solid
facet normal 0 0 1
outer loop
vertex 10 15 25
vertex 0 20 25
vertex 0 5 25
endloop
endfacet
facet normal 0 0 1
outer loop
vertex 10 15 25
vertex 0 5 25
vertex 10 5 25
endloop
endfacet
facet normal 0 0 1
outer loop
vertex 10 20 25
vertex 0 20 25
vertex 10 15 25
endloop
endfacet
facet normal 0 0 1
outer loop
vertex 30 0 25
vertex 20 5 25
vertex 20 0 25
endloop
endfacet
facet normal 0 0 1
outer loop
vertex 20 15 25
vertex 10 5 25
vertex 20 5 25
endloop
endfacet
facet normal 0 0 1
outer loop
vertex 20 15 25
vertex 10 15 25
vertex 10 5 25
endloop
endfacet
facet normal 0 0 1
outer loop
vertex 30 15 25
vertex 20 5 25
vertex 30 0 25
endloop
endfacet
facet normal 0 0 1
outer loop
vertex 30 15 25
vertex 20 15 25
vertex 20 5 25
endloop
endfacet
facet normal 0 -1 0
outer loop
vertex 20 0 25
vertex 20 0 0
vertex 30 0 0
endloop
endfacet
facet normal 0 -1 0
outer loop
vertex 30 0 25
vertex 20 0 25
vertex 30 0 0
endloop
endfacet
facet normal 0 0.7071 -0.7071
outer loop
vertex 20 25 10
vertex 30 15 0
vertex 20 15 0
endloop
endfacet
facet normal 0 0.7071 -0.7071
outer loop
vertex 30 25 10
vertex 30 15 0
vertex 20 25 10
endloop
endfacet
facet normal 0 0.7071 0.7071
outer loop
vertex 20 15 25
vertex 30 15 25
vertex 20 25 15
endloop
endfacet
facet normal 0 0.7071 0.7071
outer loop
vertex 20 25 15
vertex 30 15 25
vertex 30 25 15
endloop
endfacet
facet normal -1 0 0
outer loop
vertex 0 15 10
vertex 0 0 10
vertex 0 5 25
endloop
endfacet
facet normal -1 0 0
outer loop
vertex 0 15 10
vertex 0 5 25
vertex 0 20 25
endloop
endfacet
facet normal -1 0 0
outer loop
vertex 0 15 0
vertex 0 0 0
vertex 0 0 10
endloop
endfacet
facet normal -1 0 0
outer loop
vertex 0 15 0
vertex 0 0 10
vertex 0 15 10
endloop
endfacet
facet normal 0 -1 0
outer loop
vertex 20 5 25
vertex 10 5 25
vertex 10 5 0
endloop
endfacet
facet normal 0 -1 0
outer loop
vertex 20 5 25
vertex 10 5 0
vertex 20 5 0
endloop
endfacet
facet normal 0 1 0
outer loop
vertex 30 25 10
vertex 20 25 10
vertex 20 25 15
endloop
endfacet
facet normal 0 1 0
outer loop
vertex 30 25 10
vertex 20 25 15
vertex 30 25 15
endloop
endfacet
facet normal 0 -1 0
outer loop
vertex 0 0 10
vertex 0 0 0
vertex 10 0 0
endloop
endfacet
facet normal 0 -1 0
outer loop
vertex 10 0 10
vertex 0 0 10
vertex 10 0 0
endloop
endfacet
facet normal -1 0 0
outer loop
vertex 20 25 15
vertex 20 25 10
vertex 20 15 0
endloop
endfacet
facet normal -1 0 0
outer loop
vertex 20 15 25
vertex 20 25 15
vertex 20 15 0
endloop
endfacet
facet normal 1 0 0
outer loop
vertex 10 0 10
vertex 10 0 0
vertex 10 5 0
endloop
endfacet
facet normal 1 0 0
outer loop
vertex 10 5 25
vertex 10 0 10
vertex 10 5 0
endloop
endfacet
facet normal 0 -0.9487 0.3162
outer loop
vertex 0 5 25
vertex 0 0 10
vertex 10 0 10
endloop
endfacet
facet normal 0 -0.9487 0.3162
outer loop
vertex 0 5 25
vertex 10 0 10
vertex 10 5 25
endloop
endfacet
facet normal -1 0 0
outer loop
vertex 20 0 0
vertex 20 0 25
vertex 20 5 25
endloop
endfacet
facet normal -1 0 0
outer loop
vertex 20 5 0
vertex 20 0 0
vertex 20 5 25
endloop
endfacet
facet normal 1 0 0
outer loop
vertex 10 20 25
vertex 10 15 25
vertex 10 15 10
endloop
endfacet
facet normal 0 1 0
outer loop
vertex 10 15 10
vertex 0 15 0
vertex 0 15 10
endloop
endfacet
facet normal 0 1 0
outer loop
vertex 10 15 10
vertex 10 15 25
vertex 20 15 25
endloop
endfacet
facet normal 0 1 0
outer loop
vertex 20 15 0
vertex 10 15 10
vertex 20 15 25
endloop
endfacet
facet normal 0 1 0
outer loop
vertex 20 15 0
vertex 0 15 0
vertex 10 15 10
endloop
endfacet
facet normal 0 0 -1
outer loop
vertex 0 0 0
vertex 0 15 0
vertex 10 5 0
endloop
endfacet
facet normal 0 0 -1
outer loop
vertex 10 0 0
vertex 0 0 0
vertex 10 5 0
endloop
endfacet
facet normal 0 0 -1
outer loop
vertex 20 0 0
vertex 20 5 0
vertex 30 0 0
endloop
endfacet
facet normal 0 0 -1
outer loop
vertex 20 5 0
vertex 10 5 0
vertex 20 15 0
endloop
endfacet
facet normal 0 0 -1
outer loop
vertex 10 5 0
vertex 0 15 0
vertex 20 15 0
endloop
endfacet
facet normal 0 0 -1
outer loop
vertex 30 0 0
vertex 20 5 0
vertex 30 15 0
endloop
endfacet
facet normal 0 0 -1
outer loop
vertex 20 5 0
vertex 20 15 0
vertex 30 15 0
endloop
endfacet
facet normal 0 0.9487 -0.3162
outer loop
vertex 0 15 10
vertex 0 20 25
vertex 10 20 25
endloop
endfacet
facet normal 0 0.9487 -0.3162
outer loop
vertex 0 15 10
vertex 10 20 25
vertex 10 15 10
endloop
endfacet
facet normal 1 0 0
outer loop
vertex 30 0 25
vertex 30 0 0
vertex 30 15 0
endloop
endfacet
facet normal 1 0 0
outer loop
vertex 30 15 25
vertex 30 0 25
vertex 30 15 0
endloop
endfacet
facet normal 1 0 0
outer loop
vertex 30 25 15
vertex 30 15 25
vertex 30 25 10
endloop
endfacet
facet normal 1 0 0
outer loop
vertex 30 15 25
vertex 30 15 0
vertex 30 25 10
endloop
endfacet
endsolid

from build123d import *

# Parameters (mm, degrees)
SKETCH1_W           = 30
SKETCH1_H           = 25
BOSS_EXTRUDE1_DEPTH = 25
CUT_EXTRUDE1_DEPTH  = 10
SKETCH3_W           = 10
SKETCH3_H           = 5
CUT_EXTRUDE2_DEPTH  = 30
CUT_EXTRUDE3_DEPTH  = 30
CUT_EXTRUDE5_DEPTH  = 10
SKETCH7_W           = 10
SKETCH7_H           = 10
CUT_EXTRUDE6_DEPTH  = 5


with BuildPart() as part:
    # Sketch1 → Boss-Extrude1 (new body)
    with BuildSketch(Plane.XY):
        with Locations((15, 12.5)):
            Rectangle(SKETCH1_W, SKETCH1_H)
    extrude(amount=BOSS_EXTRUDE1_DEPTH)

    # Sketch2 → Cut-Extrude1 (cut)
    with BuildSketch(Plane(origin=(30, 0, 0), x_dir=(0, 0, -1), z_dir=(1, 0, 0))):
        Polygon((-25, 25), (-25, 15), (-15, 25), align=None)
        Polygon((-10, 25), (0, 25), (0, 15), align=None)
    extrude(amount=-CUT_EXTRUDE1_DEPTH, mode=Mode.SUBTRACT)

    # Sketch3 → Cut-Extrude2 (cut)
    with BuildSketch(Plane.XY.offset(25)):
        with Locations((15, 2.5)):
            Rectangle(SKETCH3_W, SKETCH3_H)
    extrude(amount=-CUT_EXTRUDE2_DEPTH, mode=Mode.SUBTRACT)

    # Sketch4 → Cut-Extrude3 (cut)
    with BuildSketch(Plane.XY.offset(25)):
        Polygon((0, 25), (20, 25), (20, 15), (10, 15), (10, 20), (0, 20), align=None)
    extrude(amount=-CUT_EXTRUDE3_DEPTH, mode=Mode.SUBTRACT)

    # Sketch6 → Cut-Extrude5 (cut)
    with BuildSketch(Plane.ZY):
        Polygon((25, 20), (10, 15), (10, 20), align=None)
        Polygon((25, 0), (10, 0), (25, 5), align=None)
    extrude(amount=-CUT_EXTRUDE5_DEPTH, mode=Mode.SUBTRACT)

    # Sketch7 → Cut-Extrude6 (cut)
    with BuildSketch(Plane(origin=(0, 20, 0), x_dir=(1, 0, 0), z_dir=(0, 1, 0))):
        with Locations((5, -5)):
            Rectangle(SKETCH7_W, SKETCH7_H)
    extrude(amount=-CUT_EXTRUDE6_DEPTH, mode=Mode.SUBTRACT)


solid = part.part
